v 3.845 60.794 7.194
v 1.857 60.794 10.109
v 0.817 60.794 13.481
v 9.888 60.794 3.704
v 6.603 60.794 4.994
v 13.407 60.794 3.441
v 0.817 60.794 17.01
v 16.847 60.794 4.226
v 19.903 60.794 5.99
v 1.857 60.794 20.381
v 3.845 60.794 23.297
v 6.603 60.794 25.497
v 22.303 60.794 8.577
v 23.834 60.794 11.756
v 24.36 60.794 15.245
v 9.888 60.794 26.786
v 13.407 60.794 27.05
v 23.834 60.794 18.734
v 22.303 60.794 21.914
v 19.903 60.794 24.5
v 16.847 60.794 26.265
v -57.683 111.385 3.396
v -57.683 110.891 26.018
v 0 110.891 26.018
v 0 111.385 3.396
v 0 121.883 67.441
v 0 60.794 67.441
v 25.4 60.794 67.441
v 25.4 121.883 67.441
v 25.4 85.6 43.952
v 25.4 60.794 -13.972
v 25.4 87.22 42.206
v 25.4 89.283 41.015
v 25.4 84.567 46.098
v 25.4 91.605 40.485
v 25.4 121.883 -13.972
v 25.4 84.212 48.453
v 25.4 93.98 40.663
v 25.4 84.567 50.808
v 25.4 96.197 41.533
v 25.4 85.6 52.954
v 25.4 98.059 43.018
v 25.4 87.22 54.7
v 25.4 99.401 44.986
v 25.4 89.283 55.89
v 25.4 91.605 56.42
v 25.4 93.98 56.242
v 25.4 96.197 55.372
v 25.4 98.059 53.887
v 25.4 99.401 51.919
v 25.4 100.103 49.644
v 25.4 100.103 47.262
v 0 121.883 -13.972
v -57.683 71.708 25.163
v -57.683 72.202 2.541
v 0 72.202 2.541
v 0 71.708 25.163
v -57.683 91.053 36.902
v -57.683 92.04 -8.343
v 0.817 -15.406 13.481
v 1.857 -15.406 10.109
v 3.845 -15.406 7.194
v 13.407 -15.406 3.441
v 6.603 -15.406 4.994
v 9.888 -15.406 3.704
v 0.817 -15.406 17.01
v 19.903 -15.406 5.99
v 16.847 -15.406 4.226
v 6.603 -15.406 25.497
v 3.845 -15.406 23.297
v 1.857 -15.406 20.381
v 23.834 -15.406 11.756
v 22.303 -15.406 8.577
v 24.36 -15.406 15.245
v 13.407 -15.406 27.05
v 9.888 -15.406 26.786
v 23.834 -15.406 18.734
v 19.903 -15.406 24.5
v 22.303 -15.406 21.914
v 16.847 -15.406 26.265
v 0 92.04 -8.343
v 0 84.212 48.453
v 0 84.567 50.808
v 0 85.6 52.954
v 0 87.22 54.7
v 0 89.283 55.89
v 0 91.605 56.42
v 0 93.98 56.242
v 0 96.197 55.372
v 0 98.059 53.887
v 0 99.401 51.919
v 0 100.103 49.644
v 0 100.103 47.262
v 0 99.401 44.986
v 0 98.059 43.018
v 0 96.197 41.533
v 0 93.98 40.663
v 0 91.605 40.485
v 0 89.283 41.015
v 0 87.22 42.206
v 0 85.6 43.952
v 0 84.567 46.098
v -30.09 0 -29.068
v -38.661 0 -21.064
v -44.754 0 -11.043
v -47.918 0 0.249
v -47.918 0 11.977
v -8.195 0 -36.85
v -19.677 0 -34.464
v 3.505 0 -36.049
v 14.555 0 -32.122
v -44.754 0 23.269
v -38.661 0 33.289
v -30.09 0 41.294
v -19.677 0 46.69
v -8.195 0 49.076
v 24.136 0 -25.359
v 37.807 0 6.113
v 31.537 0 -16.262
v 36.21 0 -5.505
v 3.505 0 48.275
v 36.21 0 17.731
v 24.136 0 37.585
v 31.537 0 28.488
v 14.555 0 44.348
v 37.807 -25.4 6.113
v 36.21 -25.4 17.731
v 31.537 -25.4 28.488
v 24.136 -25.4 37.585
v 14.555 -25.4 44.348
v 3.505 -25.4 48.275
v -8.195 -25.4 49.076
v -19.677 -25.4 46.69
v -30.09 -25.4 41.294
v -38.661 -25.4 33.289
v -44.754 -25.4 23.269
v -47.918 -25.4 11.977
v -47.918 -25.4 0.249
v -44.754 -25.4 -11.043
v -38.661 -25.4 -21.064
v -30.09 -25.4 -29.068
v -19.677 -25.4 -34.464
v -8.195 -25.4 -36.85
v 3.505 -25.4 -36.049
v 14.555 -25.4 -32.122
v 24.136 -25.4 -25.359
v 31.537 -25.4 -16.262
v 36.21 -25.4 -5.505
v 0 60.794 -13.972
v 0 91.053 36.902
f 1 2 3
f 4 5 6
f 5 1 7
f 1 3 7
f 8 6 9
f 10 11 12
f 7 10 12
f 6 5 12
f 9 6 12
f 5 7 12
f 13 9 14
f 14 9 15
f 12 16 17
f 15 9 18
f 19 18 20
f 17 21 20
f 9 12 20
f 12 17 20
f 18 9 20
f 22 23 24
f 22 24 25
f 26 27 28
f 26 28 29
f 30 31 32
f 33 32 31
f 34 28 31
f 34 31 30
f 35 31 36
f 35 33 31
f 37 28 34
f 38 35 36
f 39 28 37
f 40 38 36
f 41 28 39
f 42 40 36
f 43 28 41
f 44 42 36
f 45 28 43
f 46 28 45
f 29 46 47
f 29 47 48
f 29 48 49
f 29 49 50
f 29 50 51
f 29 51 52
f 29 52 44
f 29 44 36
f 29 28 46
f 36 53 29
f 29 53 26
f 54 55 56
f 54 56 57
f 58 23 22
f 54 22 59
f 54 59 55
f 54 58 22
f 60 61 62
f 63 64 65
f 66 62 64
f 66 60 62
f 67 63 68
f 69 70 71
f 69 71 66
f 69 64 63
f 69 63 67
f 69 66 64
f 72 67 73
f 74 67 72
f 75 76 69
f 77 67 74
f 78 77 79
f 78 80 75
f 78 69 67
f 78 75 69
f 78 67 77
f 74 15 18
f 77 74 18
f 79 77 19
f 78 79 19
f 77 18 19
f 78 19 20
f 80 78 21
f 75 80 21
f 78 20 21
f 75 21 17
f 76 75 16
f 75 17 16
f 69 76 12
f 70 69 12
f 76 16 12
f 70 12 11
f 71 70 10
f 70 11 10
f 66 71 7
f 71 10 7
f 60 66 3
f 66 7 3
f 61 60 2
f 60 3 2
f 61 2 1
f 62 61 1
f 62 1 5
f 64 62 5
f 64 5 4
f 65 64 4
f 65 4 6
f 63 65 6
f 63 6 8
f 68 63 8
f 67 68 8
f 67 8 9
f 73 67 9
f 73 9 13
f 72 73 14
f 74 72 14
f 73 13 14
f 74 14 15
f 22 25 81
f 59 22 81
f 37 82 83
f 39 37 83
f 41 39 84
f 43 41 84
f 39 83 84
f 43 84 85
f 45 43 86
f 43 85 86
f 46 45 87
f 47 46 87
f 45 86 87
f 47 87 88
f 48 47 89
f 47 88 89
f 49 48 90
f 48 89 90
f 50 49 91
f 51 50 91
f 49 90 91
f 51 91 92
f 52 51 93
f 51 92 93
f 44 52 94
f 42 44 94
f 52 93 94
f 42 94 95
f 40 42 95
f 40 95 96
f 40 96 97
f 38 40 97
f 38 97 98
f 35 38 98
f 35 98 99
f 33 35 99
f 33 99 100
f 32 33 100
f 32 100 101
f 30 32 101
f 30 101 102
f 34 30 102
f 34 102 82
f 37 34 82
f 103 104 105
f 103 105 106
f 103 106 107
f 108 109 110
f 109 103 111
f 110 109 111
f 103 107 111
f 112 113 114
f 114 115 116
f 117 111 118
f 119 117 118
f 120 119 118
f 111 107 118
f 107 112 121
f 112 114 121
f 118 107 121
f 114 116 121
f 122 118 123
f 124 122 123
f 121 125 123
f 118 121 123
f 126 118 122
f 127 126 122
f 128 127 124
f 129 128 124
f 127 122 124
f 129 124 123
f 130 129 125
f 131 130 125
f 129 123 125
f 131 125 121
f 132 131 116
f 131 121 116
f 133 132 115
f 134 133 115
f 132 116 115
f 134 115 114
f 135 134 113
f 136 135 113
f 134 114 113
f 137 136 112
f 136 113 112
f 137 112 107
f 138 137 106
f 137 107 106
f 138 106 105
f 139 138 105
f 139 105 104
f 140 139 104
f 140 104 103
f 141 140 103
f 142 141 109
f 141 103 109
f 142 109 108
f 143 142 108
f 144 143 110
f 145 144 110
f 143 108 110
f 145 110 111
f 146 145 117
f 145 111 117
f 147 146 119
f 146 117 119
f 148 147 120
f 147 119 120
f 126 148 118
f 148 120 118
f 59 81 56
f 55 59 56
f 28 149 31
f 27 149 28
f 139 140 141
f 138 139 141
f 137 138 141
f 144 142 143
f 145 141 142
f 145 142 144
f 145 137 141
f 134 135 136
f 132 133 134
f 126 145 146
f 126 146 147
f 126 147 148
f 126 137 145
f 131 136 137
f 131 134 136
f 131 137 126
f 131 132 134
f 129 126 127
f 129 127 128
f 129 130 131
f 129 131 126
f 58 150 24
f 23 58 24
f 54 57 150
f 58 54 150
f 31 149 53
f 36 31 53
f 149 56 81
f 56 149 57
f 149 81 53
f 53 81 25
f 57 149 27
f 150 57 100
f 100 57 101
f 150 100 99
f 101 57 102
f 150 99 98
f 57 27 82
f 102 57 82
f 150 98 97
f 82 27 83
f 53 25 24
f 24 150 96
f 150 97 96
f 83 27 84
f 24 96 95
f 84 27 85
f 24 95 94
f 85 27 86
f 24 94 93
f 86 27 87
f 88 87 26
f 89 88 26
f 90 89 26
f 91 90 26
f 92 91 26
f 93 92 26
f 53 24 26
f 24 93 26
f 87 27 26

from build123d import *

# Parameters (mm, degrees)
F0_R     = 43.062987
F1_DEPTH = 25.4
F2_W     = 61.088197
F2_H     = 81.41325
F3_DEPTH = 25.4
F4_R     = 11.83762
F5_DEPTH = 76.2
F7_D     = 15.980156
F9_DEPTH = 57.6834


with BuildPart() as f1:
    # F0 (on Front) → F1 (new body)
    with BuildSketch(Plane.XZ):
        with Locations((-5.256481, 6.112957)):
            Circle(F0_R)
    extrude(amount=F1_DEPTH)


with BuildPart() as f3:
    # F2 (on Right) → F3 (new body)
    with BuildSketch(Plane.YZ):
        with Locations((91.338594, 26.734473)):
            Rectangle(F2_W, F2_H)
    extrude(amount=F3_DEPTH)

    # F7 (through all)
    with Locations(Plane.YZ.offset(25.4)):
        with Locations((92.202052, 48.45272)):
            Hole(F7_D / 2)

    # F8 (on face) → F9 (join)
    with BuildSketch(Plane(origin=(0, 0, 0), x_dir=(0, -1, 0), z_dir=(-1, 0, 0))):
        Polygon((-71.708072, 25.163366), (-91.052707, 36.901979), (-110.890962, 26.01834), (-111.384581, 3.396088), (-92.039946, -8.342525), (-72.201691, 2.541114), align=None)
    extrude(amount=F9_DEPTH)


with BuildPart() as f5:
    # F4 (on face) → F5 (new body)
    with BuildSketch(Plane.XZ.offset(-60.794495)):
        with Locations((12.522262, 15.245267)):
            Circle(F4_R)
    extrude(amount=F5_DEPTH)


solid = Compound([f1.part, f3.part, f5.part])
